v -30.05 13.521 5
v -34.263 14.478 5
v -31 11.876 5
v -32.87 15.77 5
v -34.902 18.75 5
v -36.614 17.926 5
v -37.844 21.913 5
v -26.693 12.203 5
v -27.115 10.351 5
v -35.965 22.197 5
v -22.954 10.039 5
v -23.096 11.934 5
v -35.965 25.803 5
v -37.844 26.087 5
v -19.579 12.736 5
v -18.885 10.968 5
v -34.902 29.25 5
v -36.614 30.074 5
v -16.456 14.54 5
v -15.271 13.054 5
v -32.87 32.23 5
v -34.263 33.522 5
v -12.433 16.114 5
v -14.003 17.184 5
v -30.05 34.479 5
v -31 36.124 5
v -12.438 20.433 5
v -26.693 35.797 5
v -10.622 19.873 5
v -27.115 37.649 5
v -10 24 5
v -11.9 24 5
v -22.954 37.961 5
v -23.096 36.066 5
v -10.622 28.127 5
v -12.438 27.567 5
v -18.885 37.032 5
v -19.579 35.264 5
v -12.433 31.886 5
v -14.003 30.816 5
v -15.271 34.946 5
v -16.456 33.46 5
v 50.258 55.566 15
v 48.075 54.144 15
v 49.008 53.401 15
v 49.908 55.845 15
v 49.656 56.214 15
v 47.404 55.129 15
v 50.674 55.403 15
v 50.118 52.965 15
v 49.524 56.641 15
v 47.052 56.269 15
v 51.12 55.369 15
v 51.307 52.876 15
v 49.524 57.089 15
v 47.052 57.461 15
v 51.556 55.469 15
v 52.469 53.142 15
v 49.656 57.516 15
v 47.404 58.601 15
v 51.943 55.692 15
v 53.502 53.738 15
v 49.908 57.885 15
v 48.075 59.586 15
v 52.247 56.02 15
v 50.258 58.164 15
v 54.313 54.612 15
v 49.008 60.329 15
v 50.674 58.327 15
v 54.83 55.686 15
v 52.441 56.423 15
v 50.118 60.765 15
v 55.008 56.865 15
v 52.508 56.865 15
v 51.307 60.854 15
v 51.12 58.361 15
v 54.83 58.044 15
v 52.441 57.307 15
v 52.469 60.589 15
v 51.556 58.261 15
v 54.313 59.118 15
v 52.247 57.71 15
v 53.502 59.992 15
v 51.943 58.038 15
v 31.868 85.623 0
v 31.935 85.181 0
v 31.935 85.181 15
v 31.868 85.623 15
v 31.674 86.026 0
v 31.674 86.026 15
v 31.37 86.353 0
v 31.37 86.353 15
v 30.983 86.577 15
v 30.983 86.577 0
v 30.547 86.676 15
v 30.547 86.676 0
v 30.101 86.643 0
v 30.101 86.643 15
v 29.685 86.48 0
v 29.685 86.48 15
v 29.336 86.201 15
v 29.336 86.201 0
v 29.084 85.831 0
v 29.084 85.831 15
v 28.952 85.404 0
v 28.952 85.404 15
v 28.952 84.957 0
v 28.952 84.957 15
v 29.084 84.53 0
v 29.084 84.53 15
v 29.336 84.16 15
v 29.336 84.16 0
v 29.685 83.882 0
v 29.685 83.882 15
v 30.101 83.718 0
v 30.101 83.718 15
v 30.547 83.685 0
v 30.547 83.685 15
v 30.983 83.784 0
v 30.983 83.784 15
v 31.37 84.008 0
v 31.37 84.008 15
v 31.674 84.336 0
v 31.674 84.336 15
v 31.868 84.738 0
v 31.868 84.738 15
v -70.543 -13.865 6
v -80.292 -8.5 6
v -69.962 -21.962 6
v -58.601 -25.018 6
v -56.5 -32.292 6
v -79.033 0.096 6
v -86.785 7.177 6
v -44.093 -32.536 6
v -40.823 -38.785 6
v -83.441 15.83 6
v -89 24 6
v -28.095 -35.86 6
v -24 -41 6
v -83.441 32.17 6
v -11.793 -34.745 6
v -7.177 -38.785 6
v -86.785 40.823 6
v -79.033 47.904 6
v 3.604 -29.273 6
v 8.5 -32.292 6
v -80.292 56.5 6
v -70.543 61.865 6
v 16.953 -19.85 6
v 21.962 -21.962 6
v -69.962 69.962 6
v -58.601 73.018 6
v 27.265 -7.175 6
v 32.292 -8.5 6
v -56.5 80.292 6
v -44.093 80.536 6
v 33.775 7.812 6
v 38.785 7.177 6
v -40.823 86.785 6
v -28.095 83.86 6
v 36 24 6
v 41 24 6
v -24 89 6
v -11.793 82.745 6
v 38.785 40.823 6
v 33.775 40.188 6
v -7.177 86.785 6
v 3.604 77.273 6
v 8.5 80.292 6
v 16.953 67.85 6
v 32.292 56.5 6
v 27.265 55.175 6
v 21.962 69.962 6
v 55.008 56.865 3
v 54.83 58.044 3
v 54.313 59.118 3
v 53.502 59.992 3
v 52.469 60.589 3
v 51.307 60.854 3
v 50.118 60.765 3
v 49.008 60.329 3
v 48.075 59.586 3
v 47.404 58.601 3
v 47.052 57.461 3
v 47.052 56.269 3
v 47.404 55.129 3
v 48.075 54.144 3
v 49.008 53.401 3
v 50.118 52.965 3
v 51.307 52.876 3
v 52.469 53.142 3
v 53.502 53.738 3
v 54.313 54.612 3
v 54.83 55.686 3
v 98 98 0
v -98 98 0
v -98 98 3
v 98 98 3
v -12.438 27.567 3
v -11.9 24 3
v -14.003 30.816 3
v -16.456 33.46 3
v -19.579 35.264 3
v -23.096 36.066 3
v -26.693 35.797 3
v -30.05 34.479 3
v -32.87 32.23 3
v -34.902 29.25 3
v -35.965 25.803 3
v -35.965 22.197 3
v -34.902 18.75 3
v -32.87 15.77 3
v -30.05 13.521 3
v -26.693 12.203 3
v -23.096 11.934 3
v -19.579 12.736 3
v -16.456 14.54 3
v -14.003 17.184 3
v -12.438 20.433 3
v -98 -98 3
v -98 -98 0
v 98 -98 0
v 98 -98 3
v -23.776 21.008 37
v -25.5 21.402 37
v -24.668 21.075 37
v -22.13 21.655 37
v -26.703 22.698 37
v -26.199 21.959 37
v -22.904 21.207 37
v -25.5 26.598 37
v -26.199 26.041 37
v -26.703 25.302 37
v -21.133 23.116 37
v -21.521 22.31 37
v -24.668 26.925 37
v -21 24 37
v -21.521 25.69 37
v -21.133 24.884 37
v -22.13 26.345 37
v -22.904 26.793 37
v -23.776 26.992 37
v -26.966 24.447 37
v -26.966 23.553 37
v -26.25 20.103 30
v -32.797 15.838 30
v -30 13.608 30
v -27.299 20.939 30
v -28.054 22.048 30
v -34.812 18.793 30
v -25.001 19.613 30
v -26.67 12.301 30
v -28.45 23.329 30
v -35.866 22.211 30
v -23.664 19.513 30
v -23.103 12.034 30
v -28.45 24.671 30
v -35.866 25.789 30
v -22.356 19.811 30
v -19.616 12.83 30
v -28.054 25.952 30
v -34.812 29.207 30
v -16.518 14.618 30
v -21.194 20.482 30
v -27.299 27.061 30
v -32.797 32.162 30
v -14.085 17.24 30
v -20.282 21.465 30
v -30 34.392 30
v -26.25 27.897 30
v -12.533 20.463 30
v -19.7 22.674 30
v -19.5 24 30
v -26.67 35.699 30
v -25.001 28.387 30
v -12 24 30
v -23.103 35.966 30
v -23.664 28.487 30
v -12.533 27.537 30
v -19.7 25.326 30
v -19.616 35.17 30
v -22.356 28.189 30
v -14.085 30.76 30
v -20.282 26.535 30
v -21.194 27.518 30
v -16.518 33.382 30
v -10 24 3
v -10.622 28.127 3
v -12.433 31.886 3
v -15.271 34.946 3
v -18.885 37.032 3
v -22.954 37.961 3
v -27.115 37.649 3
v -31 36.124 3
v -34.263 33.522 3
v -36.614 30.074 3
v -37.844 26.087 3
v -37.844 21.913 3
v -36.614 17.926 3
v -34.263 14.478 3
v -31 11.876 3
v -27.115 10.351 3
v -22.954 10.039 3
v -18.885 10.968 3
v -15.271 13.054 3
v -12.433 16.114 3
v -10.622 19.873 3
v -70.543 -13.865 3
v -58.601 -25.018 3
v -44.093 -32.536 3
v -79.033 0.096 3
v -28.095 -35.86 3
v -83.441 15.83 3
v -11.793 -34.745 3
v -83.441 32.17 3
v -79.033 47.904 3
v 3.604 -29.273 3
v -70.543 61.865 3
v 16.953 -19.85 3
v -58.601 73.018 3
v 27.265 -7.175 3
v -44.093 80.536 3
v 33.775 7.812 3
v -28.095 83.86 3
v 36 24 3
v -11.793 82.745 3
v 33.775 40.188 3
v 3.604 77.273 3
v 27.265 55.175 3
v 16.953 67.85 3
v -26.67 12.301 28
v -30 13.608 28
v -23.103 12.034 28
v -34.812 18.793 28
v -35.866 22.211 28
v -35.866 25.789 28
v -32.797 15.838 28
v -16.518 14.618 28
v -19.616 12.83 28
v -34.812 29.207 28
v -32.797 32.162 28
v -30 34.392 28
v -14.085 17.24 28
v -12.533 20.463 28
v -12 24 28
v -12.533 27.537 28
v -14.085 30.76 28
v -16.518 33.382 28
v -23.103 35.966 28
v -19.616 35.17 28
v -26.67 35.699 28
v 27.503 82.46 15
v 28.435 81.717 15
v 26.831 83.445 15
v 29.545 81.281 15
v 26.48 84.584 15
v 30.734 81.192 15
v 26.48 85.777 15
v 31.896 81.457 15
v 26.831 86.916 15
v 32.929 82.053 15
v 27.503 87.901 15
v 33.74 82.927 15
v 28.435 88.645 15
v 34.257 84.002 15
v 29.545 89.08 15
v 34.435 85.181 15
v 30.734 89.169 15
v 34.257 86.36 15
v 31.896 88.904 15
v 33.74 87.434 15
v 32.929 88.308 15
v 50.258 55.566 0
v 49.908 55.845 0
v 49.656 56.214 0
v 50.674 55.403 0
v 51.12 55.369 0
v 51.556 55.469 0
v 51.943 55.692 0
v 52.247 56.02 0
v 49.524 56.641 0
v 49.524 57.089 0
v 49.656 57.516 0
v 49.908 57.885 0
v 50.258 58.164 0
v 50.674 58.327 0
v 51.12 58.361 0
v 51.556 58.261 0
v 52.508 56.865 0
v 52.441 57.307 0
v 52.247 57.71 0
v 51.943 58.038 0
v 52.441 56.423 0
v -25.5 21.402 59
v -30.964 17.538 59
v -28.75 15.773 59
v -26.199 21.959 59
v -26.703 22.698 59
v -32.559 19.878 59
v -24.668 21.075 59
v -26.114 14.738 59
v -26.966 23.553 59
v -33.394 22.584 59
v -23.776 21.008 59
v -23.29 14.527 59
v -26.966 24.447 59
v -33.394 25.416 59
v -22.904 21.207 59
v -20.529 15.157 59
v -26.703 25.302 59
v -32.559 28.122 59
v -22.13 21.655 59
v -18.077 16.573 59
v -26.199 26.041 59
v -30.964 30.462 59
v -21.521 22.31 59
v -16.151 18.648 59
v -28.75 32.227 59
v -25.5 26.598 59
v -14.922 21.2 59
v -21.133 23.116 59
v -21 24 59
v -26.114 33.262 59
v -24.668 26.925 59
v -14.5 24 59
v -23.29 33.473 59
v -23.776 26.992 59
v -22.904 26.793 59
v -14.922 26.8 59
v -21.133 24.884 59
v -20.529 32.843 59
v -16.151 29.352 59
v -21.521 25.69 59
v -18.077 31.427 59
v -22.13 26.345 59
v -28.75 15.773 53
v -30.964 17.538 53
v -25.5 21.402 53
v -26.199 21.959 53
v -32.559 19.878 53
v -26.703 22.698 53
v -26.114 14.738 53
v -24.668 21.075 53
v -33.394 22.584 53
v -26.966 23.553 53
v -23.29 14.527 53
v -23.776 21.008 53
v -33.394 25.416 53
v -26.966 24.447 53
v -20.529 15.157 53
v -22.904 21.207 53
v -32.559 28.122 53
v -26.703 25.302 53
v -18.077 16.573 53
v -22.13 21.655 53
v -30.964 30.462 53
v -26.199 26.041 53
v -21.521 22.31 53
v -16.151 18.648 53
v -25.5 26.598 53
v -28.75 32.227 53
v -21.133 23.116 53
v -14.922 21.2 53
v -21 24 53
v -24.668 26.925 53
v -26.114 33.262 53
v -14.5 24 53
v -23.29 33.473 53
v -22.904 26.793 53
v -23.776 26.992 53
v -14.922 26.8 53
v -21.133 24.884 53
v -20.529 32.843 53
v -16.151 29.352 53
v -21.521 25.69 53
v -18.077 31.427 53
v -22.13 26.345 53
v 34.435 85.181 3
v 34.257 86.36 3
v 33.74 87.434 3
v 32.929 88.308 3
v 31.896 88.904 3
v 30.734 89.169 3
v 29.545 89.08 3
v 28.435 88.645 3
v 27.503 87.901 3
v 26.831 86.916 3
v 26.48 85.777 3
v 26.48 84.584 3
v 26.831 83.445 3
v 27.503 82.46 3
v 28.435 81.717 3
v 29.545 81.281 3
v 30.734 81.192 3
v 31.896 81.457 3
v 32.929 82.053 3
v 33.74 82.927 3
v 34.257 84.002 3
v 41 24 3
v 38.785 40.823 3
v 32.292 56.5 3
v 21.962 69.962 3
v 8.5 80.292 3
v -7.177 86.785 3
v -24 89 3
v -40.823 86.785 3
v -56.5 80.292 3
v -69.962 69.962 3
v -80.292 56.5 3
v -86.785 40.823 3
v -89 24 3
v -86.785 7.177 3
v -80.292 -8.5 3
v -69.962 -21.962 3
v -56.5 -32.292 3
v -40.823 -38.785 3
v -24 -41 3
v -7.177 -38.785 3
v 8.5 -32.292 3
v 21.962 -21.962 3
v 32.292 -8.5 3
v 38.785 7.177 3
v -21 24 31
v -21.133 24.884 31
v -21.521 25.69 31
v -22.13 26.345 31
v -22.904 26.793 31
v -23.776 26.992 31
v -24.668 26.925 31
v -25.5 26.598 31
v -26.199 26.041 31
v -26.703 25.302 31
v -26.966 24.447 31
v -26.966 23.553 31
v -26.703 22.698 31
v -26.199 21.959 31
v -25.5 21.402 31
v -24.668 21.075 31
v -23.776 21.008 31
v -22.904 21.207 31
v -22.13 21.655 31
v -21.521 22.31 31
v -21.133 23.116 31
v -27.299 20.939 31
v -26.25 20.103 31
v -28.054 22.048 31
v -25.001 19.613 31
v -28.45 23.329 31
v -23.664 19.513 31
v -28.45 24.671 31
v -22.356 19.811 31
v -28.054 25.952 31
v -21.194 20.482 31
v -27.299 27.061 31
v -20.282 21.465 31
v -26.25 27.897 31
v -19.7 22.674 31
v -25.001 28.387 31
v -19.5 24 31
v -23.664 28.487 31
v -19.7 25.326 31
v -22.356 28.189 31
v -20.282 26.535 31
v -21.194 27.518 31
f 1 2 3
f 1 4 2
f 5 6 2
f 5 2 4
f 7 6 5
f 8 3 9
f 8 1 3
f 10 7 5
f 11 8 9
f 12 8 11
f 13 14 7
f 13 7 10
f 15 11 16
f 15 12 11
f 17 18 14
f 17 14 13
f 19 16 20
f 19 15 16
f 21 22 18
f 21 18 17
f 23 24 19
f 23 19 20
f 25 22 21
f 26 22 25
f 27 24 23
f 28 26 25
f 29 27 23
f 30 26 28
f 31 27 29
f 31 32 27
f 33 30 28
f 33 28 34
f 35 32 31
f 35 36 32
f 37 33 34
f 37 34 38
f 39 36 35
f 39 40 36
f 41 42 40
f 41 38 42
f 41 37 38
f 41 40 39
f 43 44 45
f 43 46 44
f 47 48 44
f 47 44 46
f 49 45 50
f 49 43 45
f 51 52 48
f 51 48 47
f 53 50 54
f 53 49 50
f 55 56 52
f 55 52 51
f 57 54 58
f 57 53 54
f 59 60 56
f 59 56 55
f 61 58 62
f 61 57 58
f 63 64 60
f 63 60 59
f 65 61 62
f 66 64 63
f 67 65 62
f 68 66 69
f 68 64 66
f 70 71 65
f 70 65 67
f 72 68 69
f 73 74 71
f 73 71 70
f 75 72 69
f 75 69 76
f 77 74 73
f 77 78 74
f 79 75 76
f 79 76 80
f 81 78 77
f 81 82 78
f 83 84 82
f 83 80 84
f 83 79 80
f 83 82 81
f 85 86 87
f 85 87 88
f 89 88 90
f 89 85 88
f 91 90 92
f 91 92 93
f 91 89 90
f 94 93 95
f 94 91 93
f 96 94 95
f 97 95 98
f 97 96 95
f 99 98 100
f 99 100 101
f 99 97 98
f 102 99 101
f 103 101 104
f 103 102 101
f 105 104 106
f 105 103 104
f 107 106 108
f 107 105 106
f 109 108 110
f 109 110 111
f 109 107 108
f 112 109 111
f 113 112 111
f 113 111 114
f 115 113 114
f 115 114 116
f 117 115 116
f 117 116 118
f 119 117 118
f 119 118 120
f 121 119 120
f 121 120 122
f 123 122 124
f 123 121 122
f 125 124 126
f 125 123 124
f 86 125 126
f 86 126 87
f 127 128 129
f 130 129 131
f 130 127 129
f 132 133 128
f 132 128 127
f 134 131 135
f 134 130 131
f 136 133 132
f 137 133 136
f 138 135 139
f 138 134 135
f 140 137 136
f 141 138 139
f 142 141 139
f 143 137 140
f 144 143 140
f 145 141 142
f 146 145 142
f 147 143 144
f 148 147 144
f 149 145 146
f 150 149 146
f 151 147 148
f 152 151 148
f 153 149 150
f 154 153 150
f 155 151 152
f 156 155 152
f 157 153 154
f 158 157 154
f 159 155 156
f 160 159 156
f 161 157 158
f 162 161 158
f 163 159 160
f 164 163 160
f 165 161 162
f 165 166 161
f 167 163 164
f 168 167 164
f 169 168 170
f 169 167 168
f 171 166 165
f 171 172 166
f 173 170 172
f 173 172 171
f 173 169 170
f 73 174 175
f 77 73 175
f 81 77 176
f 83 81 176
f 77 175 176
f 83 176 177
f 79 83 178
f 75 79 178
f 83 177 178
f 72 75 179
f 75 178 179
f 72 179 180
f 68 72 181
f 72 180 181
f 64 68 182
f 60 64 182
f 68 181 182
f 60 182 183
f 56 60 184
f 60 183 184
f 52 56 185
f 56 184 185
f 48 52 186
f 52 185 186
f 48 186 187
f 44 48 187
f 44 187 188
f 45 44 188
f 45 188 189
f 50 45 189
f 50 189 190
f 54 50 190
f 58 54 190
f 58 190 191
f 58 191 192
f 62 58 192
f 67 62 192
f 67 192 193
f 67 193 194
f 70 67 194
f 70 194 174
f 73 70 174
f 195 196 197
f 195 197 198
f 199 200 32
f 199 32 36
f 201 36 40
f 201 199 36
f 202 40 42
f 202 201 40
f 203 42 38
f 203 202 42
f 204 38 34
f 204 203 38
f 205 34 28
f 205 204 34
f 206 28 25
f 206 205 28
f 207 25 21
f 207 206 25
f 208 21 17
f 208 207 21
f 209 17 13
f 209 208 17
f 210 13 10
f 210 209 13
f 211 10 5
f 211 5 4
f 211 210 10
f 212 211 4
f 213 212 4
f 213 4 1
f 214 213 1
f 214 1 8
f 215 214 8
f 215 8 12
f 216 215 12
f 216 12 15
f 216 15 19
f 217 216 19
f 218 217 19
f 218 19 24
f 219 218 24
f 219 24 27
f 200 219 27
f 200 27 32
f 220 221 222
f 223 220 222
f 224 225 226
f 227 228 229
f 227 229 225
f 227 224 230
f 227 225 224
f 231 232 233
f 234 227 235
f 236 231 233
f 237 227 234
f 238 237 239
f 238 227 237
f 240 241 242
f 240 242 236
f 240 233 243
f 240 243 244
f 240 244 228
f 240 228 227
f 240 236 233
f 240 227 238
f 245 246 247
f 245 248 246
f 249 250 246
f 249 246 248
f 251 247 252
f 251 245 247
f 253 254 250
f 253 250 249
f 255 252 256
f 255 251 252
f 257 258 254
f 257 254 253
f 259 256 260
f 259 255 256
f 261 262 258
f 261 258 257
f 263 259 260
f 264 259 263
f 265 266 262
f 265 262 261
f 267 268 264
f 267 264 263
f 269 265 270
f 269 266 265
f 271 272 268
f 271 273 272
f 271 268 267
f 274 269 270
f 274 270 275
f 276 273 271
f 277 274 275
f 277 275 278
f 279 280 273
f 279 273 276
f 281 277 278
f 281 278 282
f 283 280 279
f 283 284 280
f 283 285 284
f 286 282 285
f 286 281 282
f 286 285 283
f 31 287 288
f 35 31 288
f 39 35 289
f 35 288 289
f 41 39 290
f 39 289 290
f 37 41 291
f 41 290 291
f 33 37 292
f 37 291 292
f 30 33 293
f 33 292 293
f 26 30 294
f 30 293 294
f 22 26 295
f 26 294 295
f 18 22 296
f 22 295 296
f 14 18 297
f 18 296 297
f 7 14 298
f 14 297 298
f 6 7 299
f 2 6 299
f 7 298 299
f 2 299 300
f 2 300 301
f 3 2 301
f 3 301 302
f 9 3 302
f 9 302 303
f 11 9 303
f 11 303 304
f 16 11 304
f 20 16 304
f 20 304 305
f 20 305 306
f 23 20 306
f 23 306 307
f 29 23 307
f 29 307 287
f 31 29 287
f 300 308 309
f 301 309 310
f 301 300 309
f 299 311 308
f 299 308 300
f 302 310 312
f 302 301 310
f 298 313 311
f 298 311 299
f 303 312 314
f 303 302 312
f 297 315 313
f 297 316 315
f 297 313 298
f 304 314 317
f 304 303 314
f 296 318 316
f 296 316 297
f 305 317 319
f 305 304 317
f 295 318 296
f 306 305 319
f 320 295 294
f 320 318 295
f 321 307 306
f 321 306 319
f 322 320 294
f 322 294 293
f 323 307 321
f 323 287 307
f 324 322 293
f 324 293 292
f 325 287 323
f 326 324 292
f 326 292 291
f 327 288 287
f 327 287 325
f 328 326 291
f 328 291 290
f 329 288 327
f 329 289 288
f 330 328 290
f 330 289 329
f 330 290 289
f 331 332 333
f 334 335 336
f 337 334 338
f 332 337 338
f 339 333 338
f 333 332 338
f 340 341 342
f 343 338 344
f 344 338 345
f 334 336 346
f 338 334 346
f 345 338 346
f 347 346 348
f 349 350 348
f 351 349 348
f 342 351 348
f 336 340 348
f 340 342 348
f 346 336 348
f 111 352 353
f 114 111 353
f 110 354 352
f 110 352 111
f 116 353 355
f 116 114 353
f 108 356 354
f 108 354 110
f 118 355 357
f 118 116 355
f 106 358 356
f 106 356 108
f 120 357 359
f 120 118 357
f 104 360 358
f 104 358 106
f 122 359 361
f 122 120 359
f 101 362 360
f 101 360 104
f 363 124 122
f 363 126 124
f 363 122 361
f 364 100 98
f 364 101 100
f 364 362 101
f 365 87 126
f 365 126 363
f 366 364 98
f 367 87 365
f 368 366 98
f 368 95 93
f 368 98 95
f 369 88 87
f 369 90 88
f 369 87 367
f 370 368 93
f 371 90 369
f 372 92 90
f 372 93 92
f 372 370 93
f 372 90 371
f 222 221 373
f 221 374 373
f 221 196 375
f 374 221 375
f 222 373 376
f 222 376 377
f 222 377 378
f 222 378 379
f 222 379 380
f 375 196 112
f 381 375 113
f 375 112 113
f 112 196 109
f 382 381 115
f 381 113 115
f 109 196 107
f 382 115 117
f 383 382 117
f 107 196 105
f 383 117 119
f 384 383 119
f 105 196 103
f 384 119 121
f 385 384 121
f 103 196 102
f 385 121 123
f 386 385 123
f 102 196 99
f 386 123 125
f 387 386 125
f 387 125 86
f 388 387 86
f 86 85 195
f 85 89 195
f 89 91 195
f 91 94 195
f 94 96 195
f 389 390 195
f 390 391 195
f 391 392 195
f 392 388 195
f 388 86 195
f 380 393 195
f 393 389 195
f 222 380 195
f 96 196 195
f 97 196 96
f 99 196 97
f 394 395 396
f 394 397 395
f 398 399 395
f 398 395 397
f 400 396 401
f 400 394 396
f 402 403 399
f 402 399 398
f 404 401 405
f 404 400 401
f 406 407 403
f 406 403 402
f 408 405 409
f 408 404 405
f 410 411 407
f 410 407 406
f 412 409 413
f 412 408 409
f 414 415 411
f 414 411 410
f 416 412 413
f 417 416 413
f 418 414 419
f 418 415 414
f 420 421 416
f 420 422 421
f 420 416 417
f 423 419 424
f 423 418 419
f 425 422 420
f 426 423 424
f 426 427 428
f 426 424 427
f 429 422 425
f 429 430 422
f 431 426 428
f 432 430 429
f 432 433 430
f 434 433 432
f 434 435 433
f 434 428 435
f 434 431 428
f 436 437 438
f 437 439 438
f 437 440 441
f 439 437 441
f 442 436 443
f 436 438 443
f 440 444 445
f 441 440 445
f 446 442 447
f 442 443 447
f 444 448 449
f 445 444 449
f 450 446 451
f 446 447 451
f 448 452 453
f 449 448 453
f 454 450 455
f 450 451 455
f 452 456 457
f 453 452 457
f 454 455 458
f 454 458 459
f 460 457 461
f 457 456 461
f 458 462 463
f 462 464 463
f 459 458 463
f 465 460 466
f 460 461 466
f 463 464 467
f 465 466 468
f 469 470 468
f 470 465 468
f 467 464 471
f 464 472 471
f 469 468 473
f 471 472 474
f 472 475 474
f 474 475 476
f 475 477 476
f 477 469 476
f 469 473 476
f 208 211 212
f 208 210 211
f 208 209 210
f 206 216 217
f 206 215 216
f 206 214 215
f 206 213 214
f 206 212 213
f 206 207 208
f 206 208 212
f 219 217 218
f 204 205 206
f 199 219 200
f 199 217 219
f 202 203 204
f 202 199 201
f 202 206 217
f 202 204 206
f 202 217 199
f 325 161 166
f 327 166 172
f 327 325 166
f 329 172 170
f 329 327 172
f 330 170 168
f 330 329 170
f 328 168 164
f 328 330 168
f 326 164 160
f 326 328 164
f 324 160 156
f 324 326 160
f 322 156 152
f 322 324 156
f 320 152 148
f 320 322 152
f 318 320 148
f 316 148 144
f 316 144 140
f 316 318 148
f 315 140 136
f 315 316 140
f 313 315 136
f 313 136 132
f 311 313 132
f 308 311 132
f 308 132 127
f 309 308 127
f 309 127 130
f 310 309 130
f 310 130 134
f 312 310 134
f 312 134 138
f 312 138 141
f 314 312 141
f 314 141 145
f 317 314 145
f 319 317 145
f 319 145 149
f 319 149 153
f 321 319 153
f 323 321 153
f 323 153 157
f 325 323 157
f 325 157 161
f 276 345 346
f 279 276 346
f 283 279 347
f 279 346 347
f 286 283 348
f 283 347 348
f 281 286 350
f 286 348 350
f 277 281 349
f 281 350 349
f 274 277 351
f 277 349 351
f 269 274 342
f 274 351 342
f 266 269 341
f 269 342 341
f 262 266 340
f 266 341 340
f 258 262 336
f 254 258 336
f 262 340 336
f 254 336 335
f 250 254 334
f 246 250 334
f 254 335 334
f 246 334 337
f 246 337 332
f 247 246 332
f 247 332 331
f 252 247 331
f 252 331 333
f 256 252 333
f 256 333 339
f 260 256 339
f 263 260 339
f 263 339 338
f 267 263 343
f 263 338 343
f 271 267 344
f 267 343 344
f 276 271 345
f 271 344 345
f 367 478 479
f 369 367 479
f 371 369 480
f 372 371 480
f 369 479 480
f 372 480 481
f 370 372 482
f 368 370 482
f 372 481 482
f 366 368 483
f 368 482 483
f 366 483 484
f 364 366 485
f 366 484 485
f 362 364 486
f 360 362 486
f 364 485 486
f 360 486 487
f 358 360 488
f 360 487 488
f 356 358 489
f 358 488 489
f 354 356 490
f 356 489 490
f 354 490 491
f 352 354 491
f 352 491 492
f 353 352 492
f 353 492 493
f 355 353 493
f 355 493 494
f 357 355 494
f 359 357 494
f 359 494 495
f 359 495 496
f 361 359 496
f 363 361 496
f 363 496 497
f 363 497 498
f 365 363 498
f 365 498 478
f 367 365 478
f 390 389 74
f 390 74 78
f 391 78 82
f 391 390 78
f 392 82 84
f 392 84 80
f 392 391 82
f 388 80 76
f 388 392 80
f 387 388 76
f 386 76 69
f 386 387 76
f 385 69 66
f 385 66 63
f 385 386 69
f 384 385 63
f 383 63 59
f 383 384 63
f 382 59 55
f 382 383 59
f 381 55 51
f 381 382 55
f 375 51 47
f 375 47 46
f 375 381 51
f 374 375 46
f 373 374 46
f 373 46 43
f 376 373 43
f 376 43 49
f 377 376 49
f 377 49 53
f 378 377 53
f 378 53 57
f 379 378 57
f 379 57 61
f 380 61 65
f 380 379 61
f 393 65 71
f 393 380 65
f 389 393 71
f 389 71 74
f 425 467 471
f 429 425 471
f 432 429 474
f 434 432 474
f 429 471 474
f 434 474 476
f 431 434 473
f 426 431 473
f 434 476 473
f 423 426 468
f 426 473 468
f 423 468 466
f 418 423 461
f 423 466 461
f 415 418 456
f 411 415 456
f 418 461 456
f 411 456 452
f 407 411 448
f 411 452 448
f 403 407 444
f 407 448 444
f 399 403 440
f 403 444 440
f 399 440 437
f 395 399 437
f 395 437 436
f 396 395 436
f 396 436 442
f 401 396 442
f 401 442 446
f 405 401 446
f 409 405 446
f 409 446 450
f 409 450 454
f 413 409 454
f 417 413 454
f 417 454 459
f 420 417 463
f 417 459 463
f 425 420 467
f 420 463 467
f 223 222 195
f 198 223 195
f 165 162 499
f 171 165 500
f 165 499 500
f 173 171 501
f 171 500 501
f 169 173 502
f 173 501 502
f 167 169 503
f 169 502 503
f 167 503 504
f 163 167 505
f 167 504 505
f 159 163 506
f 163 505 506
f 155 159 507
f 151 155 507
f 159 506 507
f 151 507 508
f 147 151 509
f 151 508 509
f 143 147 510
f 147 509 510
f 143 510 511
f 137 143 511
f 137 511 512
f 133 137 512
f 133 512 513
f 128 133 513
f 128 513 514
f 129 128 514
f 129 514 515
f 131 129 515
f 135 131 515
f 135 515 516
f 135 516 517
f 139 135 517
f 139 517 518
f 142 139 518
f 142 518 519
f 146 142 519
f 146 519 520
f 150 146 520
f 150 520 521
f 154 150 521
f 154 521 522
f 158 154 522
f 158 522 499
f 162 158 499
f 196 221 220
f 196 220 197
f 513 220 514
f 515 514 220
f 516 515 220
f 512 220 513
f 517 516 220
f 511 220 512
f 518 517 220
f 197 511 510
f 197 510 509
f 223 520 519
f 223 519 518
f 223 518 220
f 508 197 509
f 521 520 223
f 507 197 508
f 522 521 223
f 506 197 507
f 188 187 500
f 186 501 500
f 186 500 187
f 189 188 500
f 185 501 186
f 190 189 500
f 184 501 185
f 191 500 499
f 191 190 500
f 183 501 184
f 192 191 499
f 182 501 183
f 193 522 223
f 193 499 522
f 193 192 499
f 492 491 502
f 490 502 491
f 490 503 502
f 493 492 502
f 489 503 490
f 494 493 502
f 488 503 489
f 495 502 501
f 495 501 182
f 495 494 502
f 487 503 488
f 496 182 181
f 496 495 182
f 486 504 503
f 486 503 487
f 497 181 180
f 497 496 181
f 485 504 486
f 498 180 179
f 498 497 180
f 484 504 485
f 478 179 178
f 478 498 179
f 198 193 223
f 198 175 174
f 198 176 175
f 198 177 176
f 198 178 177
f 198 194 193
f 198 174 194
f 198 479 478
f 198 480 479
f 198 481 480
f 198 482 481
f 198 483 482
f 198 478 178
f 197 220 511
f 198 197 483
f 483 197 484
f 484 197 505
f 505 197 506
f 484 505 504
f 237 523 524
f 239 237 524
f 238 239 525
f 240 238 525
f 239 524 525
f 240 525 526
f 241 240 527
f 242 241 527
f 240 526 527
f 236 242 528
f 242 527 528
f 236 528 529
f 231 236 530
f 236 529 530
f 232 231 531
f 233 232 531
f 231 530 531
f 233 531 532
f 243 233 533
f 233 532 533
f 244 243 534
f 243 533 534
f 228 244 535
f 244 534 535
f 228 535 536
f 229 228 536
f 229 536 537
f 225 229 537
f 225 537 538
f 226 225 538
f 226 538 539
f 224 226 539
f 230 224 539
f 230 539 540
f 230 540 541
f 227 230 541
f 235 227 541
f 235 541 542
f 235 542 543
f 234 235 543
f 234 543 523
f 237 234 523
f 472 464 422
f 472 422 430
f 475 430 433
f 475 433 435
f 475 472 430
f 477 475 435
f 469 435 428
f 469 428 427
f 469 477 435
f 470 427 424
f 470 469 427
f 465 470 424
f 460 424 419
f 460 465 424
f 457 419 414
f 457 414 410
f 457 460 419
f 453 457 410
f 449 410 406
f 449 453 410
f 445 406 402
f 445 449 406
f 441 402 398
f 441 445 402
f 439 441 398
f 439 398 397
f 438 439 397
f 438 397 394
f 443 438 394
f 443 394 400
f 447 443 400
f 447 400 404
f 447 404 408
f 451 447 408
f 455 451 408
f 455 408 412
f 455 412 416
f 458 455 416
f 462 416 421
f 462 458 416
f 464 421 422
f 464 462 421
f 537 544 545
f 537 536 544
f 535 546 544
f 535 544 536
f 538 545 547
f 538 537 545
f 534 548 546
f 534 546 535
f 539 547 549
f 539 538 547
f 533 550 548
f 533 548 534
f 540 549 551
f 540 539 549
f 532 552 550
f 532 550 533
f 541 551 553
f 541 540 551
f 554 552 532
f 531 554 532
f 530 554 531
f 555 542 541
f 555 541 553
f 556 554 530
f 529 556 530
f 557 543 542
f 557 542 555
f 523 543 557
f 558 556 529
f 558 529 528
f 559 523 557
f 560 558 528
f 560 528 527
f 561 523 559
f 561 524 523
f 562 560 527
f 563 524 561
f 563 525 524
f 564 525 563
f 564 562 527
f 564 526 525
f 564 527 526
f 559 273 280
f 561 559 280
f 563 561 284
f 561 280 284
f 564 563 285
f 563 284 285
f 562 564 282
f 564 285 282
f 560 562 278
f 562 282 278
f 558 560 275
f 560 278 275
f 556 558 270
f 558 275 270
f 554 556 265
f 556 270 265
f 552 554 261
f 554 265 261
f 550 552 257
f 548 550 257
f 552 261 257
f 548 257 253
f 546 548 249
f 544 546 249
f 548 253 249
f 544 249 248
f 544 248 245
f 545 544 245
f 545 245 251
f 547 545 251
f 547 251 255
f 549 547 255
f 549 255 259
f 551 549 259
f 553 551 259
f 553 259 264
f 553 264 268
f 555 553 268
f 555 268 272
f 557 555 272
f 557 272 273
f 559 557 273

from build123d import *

# Parameters (mm, degrees)
F0_W      = 196
F0_H      = 196
F0_R      = 65
F0_R_2    = 4
F0_R_3    = 60
F0_R_4    = 14
F0_R_5    = 12.1
F1_DEPTH  = 3
F0_R_6    = 1.5
F2_DEPTH  = 15
F4_R      = 12
F4_R_2    = 4.5
F5_DEPTH  = 2
F4_R_3    = 3
F6_DEPTH  = 3
F7_DEPTH  = 9
F8_DEPTH  = 5
F10_R     = 9.5
F10_R_2   = 3
F11_DEPTH = 6
F12_DEPTH = 6


# Not quite as in the source:
# - a feature names something its author has since deleted; it is built from what else it names


with BuildPart() as f1:
    # F0 (on Top) → F1 (new body)
    with BuildSketch(Plane.XY):
        Rectangle(F0_W, F0_H)
        with Locations((-24, 24)):
            Circle(F0_R, mode=Mode.SUBTRACT)
        with Locations((30.4351176349, 85.180617585)):
            Circle(F0_R_2, mode=Mode.SUBTRACT)
        with Locations((51.0076014651, 56.8650227818)):
            Circle(F0_R_2, mode=Mode.SUBTRACT)
        with Locations((-24, 24)):
            Circle(F0_R)
        with Locations((-24, 24)):
            Circle(F0_R_3, mode=Mode.SUBTRACT)
        with Locations((-24, 24)):
            Circle(F0_R_3)
        with Locations((-24, 24)):
            Circle(F0_R_4, mode=Mode.SUBTRACT)
        with Locations((-24, 24)):
            Circle(F0_R_4)
        with Locations((-24, 24)):
            Circle(F0_R_5, mode=Mode.SUBTRACT)
        with Locations((-24, 24)):
            Circle(F0_R_5)
    extrude(amount=F1_DEPTH)

    # F0 (on Top) → F2 (join)
    with BuildSketch(Plane.XY):
        with Locations((30.4351176349, 85.180617585)):
            Circle(F0_R_2)
        with Locations((30.4351176349, 85.180617585)):
            Circle(F0_R_6, mode=Mode.SUBTRACT)
        with Locations((51.0076014651, 56.8650227818)):
            Circle(F0_R_2)
        with Locations((51.0076014651, 56.8650227818)):
            Circle(F0_R_6, mode=Mode.SUBTRACT)
    extrude(amount=F2_DEPTH)

    # F0 (on Top) → F8 (join)
    with BuildSketch(Plane.XY):
        with Locations((-24, 24)):
            Circle(F0_R_4)
        with Locations((-24, 24)):
            Circle(F0_R_5, mode=Mode.SUBTRACT)
    extrude(amount=F8_DEPTH)

    # F0 (on Top) → F12 (join)
    with BuildSketch(Plane.XY):
        with Locations((-24, 24)):
            Circle(F0_R)
        with Locations((-24, 24)):
            Circle(F0_R_3, mode=Mode.SUBTRACT)
    extrude(amount=F12_DEPTH)


with BuildPart() as f5:
    # F4 (on offset) → F5 (new body)
    with BuildSketch(Plane.XY.offset(28)):
        with Locations((-24, 24)):
            Circle(F4_R)
        with Locations((-24, 24)):
            Circle(F4_R_2, mode=Mode.SUBTRACT)
    extrude(amount=F5_DEPTH)

    # F4 (on offset) → F6 (join)
    with BuildSketch(Plane.XY.offset(28)):
        with Locations((-24, 24)):
            Circle(F4_R_2)
        with Locations((-24, 24)):
            Circle(F4_R_3, mode=Mode.SUBTRACT)
    extrude(amount=F6_DEPTH)

    # F4 (on offset) → F7 (join)
    with BuildSketch(Plane.XY.offset(28)):
        with Locations((-24, 24)):
            Circle(F4_R_3)
    extrude(amount=F7_DEPTH)


with BuildPart() as f11:
    # F10 (on offset) → F11 (new body)
    with BuildSketch(Plane.XY.offset(53)):
        with Locations((-24, 24)):
            Circle(F10_R)
        with Locations((-24, 24)):
            Circle(F10_R_2, mode=Mode.SUBTRACT)
    extrude(amount=F11_DEPTH)


solid = Compound([f1.part, f5.part, f11.part])
